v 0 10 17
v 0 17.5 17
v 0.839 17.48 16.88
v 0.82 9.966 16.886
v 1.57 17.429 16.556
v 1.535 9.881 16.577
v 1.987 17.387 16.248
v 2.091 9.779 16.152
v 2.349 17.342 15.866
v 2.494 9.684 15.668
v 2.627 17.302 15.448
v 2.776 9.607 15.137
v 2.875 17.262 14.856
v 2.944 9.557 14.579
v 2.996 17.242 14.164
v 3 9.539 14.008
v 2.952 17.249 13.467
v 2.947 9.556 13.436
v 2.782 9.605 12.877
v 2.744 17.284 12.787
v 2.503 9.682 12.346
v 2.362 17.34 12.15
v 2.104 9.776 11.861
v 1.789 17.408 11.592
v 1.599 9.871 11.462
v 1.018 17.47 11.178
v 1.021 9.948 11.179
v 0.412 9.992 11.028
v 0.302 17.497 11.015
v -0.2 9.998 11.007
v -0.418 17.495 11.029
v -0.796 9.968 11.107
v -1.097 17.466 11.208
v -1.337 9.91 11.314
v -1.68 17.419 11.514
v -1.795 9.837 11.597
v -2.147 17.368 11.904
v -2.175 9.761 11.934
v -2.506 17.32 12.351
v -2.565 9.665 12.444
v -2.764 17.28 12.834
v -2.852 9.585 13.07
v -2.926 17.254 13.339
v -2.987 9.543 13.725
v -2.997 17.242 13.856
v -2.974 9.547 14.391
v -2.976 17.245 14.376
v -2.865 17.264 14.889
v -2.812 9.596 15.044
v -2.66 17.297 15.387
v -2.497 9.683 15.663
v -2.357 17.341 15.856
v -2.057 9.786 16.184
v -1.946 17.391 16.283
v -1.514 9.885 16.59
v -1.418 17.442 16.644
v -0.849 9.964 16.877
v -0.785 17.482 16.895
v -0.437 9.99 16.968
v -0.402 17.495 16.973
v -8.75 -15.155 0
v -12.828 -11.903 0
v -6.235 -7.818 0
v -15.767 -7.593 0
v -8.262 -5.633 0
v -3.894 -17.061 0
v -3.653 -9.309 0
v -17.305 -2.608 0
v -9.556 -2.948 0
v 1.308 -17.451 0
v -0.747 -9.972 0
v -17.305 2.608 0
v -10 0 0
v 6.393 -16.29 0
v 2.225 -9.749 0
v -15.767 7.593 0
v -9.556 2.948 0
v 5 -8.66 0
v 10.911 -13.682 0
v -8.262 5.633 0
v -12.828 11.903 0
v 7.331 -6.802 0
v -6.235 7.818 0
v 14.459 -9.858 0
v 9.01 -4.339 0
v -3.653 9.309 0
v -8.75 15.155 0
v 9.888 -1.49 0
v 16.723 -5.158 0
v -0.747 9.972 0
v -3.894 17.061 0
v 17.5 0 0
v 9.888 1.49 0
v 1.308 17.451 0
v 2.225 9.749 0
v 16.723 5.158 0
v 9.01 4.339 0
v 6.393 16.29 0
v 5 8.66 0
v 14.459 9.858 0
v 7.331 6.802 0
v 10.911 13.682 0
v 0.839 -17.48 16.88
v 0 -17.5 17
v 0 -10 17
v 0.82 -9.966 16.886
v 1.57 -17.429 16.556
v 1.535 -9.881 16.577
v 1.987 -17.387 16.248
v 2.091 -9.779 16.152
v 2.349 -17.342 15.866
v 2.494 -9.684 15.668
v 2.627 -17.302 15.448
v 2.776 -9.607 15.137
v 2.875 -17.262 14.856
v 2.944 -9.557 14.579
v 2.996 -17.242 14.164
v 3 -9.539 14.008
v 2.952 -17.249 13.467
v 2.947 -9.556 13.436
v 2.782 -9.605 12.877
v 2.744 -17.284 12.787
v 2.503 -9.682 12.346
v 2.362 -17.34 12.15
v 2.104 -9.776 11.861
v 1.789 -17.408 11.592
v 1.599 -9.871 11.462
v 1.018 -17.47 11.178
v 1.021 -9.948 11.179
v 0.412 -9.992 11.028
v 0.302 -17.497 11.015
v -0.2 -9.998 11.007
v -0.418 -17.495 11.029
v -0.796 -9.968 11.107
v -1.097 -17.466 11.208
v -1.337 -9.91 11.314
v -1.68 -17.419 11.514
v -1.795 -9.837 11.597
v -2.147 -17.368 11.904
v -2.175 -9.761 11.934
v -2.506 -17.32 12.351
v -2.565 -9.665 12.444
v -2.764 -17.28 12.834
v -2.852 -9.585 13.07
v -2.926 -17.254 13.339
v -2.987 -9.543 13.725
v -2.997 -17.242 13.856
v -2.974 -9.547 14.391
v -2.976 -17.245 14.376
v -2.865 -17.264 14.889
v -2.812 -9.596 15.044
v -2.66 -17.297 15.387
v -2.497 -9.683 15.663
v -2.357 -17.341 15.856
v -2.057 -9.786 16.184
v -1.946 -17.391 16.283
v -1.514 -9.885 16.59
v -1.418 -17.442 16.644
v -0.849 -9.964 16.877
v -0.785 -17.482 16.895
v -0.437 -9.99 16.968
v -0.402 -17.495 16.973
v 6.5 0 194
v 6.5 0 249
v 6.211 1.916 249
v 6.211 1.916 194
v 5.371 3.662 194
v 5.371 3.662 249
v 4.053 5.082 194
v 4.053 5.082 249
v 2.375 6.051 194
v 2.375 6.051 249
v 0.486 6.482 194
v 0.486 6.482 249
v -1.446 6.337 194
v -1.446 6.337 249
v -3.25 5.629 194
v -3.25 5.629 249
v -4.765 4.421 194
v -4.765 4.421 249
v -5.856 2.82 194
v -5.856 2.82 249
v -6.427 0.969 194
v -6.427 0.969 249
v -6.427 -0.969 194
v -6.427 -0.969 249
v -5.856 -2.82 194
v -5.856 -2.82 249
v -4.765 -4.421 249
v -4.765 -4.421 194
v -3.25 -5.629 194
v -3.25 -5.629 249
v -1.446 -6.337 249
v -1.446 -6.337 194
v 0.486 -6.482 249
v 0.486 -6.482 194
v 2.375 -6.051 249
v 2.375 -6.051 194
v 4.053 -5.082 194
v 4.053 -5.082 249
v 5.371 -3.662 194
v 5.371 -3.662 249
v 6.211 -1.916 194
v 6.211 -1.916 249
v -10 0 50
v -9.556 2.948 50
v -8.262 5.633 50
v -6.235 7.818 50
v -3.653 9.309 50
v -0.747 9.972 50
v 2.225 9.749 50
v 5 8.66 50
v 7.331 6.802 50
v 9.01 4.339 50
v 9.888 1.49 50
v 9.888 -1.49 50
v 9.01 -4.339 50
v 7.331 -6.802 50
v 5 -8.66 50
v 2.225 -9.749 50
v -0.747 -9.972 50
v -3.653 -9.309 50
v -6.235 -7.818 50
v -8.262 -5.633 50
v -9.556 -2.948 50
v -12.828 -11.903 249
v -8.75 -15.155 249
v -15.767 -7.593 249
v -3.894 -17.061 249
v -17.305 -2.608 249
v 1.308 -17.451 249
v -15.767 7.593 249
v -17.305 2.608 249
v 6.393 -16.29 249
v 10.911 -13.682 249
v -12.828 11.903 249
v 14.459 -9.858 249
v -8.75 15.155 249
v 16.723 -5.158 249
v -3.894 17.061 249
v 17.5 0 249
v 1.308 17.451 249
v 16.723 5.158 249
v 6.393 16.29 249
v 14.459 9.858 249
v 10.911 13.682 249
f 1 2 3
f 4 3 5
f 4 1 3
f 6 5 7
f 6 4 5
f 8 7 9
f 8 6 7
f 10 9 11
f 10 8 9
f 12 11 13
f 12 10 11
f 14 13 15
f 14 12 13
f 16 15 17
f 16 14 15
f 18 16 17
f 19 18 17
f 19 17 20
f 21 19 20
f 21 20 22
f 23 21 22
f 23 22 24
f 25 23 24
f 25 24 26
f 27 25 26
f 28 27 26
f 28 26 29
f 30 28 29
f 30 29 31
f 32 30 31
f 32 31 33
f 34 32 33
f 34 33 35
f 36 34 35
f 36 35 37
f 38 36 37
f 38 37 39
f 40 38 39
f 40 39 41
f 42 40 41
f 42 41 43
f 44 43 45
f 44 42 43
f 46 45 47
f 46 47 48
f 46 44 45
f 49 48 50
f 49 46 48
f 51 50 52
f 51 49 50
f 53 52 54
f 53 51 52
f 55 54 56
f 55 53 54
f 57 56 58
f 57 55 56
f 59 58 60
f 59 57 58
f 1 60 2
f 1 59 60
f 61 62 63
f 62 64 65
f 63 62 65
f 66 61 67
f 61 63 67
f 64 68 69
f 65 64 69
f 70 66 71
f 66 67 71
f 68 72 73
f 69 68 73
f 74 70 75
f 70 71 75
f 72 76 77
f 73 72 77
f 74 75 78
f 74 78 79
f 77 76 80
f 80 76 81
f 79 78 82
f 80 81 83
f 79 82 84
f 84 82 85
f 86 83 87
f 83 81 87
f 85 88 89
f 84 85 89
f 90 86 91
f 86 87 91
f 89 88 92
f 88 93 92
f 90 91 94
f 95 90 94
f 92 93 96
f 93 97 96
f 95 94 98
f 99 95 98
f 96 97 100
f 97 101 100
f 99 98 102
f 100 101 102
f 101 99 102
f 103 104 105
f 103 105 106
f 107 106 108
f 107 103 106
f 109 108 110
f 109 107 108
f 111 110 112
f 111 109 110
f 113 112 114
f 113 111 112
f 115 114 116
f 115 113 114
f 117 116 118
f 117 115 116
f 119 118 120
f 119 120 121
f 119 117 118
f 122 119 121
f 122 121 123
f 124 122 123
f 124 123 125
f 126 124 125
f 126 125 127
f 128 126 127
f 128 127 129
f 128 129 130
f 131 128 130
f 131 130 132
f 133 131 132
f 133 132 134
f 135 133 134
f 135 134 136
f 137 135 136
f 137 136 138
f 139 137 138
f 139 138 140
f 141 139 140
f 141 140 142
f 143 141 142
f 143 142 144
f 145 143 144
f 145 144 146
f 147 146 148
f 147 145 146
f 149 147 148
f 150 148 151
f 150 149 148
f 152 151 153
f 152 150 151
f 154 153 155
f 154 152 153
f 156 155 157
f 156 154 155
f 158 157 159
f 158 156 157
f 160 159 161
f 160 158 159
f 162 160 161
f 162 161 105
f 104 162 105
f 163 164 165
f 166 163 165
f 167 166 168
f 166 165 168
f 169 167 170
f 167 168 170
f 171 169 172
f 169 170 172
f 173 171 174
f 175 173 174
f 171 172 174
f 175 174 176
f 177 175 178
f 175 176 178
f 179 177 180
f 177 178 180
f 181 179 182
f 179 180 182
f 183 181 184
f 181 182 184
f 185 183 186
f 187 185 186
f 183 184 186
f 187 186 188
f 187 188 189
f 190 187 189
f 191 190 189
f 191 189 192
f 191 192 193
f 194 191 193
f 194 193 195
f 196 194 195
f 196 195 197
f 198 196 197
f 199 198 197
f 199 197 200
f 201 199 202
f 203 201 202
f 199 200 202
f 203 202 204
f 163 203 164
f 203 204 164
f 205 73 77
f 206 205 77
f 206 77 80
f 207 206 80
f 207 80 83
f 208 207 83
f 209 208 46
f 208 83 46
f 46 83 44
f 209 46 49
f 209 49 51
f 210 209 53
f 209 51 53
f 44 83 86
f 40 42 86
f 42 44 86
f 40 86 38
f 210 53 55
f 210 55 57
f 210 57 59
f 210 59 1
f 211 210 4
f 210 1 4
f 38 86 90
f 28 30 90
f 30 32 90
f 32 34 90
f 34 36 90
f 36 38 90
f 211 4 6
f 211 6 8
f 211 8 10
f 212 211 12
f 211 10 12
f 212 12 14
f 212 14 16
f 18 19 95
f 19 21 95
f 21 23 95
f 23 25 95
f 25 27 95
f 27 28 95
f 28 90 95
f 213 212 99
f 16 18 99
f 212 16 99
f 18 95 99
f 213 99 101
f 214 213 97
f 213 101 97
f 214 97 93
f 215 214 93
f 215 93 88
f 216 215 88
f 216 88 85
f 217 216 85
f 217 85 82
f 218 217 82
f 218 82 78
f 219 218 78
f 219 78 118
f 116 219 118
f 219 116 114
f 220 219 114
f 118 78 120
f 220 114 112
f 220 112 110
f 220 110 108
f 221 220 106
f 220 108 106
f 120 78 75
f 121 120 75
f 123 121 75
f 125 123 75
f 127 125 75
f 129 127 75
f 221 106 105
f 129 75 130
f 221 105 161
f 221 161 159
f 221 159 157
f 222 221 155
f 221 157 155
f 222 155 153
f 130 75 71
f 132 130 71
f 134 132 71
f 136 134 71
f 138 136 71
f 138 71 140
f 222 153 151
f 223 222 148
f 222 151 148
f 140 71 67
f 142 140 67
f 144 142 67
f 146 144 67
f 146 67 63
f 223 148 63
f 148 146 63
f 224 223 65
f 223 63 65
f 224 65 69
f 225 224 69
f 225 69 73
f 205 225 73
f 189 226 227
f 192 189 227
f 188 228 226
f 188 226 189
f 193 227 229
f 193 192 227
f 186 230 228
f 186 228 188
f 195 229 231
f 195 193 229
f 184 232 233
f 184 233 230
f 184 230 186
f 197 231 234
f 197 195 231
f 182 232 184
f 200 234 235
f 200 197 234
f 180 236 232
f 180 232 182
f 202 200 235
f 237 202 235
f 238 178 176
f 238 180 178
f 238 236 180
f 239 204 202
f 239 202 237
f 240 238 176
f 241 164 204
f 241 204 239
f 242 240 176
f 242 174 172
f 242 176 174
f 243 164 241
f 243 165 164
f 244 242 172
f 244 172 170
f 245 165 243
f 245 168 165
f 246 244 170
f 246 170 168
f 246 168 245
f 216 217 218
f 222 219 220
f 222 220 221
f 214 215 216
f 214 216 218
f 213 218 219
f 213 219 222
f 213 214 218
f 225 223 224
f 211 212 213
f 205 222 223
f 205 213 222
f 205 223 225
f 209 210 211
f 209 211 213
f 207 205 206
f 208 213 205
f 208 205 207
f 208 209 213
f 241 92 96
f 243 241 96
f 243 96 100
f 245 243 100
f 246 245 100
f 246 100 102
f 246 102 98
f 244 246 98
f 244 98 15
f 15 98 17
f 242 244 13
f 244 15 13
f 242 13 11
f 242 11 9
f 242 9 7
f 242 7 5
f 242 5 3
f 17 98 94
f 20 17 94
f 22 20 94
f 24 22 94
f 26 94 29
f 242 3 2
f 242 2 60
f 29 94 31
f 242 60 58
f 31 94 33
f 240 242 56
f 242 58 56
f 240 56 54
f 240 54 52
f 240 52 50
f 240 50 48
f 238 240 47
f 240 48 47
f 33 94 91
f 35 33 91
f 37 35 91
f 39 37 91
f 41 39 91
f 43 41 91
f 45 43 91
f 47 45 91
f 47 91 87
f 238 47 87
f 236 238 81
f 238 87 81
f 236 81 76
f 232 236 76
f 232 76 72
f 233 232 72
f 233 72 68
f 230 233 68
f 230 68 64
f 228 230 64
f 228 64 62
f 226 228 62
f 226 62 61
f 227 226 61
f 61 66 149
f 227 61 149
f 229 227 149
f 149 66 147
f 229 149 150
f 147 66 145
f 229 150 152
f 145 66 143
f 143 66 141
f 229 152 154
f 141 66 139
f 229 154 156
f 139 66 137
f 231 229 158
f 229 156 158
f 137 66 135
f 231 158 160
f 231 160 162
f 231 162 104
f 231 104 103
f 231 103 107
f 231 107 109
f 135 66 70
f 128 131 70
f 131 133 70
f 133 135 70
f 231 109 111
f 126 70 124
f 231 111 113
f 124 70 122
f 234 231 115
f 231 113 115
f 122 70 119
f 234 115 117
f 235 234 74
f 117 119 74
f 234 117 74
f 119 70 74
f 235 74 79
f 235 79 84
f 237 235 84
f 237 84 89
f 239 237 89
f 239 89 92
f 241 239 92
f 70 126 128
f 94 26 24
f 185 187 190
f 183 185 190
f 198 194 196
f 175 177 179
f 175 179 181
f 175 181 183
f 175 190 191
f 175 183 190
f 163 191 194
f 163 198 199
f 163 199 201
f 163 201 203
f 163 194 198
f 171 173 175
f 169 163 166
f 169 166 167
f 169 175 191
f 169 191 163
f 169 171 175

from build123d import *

# Parameters (mm, degrees)
SKETCH1_R               = 17.5
BOSS_EXTRUDE1_DEPTH     = 249
SKETCH2_R               = 6.5
CUT_EXTRUDE1_DEPTH      = 55
SKETCH9_R               = 10
CUT_EXTRUDE5_DEPTH      = 50
CUT_EXTRUDE6_DEPTH      = 251.226897035
CUT_EXTRUDE6_DEPTH_BACK = 251.226897035
SKETCH10_R              = 3


with BuildPart() as part:
    # Sketch1 → Boss-Extrude1 (new body)
    with BuildSketch(Plane.XY):
        Circle(SKETCH1_R)
    extrude(amount=BOSS_EXTRUDE1_DEPTH)

    # Sketch2 → Cut-Extrude1 (cut)
    with BuildSketch(Plane.XY.offset(249)):
        Circle(SKETCH2_R)
    extrude(amount=-CUT_EXTRUDE1_DEPTH, mode=Mode.SUBTRACT)

    # Sketch9 → Cut-Extrude5 (cut)
    with BuildSketch(Plane(origin=(0, 0, 0), x_dir=(-1, 0, 0), z_dir=(0, 0, -1))):
        Circle(SKETCH9_R)
    extrude(amount=-CUT_EXTRUDE5_DEPTH, mode=Mode.SUBTRACT)

    # Sketch10 → Cut-Extrude6 (cut, two sides: drawn at the far end of the back side and taken through both)
    with BuildSketch(Plane(origin=(0, 0, 0), x_dir=(1, 0, 0), z_dir=(0, 1, 0)).offset(-CUT_EXTRUDE6_DEPTH_BACK)):
        with Locations(Location((0, -14, 0), (0, 0, 270))):
            Circle(SKETCH10_R)
    extrude(amount=CUT_EXTRUDE6_DEPTH + CUT_EXTRUDE6_DEPTH_BACK, mode=Mode.SUBTRACT)


solid = part.part
